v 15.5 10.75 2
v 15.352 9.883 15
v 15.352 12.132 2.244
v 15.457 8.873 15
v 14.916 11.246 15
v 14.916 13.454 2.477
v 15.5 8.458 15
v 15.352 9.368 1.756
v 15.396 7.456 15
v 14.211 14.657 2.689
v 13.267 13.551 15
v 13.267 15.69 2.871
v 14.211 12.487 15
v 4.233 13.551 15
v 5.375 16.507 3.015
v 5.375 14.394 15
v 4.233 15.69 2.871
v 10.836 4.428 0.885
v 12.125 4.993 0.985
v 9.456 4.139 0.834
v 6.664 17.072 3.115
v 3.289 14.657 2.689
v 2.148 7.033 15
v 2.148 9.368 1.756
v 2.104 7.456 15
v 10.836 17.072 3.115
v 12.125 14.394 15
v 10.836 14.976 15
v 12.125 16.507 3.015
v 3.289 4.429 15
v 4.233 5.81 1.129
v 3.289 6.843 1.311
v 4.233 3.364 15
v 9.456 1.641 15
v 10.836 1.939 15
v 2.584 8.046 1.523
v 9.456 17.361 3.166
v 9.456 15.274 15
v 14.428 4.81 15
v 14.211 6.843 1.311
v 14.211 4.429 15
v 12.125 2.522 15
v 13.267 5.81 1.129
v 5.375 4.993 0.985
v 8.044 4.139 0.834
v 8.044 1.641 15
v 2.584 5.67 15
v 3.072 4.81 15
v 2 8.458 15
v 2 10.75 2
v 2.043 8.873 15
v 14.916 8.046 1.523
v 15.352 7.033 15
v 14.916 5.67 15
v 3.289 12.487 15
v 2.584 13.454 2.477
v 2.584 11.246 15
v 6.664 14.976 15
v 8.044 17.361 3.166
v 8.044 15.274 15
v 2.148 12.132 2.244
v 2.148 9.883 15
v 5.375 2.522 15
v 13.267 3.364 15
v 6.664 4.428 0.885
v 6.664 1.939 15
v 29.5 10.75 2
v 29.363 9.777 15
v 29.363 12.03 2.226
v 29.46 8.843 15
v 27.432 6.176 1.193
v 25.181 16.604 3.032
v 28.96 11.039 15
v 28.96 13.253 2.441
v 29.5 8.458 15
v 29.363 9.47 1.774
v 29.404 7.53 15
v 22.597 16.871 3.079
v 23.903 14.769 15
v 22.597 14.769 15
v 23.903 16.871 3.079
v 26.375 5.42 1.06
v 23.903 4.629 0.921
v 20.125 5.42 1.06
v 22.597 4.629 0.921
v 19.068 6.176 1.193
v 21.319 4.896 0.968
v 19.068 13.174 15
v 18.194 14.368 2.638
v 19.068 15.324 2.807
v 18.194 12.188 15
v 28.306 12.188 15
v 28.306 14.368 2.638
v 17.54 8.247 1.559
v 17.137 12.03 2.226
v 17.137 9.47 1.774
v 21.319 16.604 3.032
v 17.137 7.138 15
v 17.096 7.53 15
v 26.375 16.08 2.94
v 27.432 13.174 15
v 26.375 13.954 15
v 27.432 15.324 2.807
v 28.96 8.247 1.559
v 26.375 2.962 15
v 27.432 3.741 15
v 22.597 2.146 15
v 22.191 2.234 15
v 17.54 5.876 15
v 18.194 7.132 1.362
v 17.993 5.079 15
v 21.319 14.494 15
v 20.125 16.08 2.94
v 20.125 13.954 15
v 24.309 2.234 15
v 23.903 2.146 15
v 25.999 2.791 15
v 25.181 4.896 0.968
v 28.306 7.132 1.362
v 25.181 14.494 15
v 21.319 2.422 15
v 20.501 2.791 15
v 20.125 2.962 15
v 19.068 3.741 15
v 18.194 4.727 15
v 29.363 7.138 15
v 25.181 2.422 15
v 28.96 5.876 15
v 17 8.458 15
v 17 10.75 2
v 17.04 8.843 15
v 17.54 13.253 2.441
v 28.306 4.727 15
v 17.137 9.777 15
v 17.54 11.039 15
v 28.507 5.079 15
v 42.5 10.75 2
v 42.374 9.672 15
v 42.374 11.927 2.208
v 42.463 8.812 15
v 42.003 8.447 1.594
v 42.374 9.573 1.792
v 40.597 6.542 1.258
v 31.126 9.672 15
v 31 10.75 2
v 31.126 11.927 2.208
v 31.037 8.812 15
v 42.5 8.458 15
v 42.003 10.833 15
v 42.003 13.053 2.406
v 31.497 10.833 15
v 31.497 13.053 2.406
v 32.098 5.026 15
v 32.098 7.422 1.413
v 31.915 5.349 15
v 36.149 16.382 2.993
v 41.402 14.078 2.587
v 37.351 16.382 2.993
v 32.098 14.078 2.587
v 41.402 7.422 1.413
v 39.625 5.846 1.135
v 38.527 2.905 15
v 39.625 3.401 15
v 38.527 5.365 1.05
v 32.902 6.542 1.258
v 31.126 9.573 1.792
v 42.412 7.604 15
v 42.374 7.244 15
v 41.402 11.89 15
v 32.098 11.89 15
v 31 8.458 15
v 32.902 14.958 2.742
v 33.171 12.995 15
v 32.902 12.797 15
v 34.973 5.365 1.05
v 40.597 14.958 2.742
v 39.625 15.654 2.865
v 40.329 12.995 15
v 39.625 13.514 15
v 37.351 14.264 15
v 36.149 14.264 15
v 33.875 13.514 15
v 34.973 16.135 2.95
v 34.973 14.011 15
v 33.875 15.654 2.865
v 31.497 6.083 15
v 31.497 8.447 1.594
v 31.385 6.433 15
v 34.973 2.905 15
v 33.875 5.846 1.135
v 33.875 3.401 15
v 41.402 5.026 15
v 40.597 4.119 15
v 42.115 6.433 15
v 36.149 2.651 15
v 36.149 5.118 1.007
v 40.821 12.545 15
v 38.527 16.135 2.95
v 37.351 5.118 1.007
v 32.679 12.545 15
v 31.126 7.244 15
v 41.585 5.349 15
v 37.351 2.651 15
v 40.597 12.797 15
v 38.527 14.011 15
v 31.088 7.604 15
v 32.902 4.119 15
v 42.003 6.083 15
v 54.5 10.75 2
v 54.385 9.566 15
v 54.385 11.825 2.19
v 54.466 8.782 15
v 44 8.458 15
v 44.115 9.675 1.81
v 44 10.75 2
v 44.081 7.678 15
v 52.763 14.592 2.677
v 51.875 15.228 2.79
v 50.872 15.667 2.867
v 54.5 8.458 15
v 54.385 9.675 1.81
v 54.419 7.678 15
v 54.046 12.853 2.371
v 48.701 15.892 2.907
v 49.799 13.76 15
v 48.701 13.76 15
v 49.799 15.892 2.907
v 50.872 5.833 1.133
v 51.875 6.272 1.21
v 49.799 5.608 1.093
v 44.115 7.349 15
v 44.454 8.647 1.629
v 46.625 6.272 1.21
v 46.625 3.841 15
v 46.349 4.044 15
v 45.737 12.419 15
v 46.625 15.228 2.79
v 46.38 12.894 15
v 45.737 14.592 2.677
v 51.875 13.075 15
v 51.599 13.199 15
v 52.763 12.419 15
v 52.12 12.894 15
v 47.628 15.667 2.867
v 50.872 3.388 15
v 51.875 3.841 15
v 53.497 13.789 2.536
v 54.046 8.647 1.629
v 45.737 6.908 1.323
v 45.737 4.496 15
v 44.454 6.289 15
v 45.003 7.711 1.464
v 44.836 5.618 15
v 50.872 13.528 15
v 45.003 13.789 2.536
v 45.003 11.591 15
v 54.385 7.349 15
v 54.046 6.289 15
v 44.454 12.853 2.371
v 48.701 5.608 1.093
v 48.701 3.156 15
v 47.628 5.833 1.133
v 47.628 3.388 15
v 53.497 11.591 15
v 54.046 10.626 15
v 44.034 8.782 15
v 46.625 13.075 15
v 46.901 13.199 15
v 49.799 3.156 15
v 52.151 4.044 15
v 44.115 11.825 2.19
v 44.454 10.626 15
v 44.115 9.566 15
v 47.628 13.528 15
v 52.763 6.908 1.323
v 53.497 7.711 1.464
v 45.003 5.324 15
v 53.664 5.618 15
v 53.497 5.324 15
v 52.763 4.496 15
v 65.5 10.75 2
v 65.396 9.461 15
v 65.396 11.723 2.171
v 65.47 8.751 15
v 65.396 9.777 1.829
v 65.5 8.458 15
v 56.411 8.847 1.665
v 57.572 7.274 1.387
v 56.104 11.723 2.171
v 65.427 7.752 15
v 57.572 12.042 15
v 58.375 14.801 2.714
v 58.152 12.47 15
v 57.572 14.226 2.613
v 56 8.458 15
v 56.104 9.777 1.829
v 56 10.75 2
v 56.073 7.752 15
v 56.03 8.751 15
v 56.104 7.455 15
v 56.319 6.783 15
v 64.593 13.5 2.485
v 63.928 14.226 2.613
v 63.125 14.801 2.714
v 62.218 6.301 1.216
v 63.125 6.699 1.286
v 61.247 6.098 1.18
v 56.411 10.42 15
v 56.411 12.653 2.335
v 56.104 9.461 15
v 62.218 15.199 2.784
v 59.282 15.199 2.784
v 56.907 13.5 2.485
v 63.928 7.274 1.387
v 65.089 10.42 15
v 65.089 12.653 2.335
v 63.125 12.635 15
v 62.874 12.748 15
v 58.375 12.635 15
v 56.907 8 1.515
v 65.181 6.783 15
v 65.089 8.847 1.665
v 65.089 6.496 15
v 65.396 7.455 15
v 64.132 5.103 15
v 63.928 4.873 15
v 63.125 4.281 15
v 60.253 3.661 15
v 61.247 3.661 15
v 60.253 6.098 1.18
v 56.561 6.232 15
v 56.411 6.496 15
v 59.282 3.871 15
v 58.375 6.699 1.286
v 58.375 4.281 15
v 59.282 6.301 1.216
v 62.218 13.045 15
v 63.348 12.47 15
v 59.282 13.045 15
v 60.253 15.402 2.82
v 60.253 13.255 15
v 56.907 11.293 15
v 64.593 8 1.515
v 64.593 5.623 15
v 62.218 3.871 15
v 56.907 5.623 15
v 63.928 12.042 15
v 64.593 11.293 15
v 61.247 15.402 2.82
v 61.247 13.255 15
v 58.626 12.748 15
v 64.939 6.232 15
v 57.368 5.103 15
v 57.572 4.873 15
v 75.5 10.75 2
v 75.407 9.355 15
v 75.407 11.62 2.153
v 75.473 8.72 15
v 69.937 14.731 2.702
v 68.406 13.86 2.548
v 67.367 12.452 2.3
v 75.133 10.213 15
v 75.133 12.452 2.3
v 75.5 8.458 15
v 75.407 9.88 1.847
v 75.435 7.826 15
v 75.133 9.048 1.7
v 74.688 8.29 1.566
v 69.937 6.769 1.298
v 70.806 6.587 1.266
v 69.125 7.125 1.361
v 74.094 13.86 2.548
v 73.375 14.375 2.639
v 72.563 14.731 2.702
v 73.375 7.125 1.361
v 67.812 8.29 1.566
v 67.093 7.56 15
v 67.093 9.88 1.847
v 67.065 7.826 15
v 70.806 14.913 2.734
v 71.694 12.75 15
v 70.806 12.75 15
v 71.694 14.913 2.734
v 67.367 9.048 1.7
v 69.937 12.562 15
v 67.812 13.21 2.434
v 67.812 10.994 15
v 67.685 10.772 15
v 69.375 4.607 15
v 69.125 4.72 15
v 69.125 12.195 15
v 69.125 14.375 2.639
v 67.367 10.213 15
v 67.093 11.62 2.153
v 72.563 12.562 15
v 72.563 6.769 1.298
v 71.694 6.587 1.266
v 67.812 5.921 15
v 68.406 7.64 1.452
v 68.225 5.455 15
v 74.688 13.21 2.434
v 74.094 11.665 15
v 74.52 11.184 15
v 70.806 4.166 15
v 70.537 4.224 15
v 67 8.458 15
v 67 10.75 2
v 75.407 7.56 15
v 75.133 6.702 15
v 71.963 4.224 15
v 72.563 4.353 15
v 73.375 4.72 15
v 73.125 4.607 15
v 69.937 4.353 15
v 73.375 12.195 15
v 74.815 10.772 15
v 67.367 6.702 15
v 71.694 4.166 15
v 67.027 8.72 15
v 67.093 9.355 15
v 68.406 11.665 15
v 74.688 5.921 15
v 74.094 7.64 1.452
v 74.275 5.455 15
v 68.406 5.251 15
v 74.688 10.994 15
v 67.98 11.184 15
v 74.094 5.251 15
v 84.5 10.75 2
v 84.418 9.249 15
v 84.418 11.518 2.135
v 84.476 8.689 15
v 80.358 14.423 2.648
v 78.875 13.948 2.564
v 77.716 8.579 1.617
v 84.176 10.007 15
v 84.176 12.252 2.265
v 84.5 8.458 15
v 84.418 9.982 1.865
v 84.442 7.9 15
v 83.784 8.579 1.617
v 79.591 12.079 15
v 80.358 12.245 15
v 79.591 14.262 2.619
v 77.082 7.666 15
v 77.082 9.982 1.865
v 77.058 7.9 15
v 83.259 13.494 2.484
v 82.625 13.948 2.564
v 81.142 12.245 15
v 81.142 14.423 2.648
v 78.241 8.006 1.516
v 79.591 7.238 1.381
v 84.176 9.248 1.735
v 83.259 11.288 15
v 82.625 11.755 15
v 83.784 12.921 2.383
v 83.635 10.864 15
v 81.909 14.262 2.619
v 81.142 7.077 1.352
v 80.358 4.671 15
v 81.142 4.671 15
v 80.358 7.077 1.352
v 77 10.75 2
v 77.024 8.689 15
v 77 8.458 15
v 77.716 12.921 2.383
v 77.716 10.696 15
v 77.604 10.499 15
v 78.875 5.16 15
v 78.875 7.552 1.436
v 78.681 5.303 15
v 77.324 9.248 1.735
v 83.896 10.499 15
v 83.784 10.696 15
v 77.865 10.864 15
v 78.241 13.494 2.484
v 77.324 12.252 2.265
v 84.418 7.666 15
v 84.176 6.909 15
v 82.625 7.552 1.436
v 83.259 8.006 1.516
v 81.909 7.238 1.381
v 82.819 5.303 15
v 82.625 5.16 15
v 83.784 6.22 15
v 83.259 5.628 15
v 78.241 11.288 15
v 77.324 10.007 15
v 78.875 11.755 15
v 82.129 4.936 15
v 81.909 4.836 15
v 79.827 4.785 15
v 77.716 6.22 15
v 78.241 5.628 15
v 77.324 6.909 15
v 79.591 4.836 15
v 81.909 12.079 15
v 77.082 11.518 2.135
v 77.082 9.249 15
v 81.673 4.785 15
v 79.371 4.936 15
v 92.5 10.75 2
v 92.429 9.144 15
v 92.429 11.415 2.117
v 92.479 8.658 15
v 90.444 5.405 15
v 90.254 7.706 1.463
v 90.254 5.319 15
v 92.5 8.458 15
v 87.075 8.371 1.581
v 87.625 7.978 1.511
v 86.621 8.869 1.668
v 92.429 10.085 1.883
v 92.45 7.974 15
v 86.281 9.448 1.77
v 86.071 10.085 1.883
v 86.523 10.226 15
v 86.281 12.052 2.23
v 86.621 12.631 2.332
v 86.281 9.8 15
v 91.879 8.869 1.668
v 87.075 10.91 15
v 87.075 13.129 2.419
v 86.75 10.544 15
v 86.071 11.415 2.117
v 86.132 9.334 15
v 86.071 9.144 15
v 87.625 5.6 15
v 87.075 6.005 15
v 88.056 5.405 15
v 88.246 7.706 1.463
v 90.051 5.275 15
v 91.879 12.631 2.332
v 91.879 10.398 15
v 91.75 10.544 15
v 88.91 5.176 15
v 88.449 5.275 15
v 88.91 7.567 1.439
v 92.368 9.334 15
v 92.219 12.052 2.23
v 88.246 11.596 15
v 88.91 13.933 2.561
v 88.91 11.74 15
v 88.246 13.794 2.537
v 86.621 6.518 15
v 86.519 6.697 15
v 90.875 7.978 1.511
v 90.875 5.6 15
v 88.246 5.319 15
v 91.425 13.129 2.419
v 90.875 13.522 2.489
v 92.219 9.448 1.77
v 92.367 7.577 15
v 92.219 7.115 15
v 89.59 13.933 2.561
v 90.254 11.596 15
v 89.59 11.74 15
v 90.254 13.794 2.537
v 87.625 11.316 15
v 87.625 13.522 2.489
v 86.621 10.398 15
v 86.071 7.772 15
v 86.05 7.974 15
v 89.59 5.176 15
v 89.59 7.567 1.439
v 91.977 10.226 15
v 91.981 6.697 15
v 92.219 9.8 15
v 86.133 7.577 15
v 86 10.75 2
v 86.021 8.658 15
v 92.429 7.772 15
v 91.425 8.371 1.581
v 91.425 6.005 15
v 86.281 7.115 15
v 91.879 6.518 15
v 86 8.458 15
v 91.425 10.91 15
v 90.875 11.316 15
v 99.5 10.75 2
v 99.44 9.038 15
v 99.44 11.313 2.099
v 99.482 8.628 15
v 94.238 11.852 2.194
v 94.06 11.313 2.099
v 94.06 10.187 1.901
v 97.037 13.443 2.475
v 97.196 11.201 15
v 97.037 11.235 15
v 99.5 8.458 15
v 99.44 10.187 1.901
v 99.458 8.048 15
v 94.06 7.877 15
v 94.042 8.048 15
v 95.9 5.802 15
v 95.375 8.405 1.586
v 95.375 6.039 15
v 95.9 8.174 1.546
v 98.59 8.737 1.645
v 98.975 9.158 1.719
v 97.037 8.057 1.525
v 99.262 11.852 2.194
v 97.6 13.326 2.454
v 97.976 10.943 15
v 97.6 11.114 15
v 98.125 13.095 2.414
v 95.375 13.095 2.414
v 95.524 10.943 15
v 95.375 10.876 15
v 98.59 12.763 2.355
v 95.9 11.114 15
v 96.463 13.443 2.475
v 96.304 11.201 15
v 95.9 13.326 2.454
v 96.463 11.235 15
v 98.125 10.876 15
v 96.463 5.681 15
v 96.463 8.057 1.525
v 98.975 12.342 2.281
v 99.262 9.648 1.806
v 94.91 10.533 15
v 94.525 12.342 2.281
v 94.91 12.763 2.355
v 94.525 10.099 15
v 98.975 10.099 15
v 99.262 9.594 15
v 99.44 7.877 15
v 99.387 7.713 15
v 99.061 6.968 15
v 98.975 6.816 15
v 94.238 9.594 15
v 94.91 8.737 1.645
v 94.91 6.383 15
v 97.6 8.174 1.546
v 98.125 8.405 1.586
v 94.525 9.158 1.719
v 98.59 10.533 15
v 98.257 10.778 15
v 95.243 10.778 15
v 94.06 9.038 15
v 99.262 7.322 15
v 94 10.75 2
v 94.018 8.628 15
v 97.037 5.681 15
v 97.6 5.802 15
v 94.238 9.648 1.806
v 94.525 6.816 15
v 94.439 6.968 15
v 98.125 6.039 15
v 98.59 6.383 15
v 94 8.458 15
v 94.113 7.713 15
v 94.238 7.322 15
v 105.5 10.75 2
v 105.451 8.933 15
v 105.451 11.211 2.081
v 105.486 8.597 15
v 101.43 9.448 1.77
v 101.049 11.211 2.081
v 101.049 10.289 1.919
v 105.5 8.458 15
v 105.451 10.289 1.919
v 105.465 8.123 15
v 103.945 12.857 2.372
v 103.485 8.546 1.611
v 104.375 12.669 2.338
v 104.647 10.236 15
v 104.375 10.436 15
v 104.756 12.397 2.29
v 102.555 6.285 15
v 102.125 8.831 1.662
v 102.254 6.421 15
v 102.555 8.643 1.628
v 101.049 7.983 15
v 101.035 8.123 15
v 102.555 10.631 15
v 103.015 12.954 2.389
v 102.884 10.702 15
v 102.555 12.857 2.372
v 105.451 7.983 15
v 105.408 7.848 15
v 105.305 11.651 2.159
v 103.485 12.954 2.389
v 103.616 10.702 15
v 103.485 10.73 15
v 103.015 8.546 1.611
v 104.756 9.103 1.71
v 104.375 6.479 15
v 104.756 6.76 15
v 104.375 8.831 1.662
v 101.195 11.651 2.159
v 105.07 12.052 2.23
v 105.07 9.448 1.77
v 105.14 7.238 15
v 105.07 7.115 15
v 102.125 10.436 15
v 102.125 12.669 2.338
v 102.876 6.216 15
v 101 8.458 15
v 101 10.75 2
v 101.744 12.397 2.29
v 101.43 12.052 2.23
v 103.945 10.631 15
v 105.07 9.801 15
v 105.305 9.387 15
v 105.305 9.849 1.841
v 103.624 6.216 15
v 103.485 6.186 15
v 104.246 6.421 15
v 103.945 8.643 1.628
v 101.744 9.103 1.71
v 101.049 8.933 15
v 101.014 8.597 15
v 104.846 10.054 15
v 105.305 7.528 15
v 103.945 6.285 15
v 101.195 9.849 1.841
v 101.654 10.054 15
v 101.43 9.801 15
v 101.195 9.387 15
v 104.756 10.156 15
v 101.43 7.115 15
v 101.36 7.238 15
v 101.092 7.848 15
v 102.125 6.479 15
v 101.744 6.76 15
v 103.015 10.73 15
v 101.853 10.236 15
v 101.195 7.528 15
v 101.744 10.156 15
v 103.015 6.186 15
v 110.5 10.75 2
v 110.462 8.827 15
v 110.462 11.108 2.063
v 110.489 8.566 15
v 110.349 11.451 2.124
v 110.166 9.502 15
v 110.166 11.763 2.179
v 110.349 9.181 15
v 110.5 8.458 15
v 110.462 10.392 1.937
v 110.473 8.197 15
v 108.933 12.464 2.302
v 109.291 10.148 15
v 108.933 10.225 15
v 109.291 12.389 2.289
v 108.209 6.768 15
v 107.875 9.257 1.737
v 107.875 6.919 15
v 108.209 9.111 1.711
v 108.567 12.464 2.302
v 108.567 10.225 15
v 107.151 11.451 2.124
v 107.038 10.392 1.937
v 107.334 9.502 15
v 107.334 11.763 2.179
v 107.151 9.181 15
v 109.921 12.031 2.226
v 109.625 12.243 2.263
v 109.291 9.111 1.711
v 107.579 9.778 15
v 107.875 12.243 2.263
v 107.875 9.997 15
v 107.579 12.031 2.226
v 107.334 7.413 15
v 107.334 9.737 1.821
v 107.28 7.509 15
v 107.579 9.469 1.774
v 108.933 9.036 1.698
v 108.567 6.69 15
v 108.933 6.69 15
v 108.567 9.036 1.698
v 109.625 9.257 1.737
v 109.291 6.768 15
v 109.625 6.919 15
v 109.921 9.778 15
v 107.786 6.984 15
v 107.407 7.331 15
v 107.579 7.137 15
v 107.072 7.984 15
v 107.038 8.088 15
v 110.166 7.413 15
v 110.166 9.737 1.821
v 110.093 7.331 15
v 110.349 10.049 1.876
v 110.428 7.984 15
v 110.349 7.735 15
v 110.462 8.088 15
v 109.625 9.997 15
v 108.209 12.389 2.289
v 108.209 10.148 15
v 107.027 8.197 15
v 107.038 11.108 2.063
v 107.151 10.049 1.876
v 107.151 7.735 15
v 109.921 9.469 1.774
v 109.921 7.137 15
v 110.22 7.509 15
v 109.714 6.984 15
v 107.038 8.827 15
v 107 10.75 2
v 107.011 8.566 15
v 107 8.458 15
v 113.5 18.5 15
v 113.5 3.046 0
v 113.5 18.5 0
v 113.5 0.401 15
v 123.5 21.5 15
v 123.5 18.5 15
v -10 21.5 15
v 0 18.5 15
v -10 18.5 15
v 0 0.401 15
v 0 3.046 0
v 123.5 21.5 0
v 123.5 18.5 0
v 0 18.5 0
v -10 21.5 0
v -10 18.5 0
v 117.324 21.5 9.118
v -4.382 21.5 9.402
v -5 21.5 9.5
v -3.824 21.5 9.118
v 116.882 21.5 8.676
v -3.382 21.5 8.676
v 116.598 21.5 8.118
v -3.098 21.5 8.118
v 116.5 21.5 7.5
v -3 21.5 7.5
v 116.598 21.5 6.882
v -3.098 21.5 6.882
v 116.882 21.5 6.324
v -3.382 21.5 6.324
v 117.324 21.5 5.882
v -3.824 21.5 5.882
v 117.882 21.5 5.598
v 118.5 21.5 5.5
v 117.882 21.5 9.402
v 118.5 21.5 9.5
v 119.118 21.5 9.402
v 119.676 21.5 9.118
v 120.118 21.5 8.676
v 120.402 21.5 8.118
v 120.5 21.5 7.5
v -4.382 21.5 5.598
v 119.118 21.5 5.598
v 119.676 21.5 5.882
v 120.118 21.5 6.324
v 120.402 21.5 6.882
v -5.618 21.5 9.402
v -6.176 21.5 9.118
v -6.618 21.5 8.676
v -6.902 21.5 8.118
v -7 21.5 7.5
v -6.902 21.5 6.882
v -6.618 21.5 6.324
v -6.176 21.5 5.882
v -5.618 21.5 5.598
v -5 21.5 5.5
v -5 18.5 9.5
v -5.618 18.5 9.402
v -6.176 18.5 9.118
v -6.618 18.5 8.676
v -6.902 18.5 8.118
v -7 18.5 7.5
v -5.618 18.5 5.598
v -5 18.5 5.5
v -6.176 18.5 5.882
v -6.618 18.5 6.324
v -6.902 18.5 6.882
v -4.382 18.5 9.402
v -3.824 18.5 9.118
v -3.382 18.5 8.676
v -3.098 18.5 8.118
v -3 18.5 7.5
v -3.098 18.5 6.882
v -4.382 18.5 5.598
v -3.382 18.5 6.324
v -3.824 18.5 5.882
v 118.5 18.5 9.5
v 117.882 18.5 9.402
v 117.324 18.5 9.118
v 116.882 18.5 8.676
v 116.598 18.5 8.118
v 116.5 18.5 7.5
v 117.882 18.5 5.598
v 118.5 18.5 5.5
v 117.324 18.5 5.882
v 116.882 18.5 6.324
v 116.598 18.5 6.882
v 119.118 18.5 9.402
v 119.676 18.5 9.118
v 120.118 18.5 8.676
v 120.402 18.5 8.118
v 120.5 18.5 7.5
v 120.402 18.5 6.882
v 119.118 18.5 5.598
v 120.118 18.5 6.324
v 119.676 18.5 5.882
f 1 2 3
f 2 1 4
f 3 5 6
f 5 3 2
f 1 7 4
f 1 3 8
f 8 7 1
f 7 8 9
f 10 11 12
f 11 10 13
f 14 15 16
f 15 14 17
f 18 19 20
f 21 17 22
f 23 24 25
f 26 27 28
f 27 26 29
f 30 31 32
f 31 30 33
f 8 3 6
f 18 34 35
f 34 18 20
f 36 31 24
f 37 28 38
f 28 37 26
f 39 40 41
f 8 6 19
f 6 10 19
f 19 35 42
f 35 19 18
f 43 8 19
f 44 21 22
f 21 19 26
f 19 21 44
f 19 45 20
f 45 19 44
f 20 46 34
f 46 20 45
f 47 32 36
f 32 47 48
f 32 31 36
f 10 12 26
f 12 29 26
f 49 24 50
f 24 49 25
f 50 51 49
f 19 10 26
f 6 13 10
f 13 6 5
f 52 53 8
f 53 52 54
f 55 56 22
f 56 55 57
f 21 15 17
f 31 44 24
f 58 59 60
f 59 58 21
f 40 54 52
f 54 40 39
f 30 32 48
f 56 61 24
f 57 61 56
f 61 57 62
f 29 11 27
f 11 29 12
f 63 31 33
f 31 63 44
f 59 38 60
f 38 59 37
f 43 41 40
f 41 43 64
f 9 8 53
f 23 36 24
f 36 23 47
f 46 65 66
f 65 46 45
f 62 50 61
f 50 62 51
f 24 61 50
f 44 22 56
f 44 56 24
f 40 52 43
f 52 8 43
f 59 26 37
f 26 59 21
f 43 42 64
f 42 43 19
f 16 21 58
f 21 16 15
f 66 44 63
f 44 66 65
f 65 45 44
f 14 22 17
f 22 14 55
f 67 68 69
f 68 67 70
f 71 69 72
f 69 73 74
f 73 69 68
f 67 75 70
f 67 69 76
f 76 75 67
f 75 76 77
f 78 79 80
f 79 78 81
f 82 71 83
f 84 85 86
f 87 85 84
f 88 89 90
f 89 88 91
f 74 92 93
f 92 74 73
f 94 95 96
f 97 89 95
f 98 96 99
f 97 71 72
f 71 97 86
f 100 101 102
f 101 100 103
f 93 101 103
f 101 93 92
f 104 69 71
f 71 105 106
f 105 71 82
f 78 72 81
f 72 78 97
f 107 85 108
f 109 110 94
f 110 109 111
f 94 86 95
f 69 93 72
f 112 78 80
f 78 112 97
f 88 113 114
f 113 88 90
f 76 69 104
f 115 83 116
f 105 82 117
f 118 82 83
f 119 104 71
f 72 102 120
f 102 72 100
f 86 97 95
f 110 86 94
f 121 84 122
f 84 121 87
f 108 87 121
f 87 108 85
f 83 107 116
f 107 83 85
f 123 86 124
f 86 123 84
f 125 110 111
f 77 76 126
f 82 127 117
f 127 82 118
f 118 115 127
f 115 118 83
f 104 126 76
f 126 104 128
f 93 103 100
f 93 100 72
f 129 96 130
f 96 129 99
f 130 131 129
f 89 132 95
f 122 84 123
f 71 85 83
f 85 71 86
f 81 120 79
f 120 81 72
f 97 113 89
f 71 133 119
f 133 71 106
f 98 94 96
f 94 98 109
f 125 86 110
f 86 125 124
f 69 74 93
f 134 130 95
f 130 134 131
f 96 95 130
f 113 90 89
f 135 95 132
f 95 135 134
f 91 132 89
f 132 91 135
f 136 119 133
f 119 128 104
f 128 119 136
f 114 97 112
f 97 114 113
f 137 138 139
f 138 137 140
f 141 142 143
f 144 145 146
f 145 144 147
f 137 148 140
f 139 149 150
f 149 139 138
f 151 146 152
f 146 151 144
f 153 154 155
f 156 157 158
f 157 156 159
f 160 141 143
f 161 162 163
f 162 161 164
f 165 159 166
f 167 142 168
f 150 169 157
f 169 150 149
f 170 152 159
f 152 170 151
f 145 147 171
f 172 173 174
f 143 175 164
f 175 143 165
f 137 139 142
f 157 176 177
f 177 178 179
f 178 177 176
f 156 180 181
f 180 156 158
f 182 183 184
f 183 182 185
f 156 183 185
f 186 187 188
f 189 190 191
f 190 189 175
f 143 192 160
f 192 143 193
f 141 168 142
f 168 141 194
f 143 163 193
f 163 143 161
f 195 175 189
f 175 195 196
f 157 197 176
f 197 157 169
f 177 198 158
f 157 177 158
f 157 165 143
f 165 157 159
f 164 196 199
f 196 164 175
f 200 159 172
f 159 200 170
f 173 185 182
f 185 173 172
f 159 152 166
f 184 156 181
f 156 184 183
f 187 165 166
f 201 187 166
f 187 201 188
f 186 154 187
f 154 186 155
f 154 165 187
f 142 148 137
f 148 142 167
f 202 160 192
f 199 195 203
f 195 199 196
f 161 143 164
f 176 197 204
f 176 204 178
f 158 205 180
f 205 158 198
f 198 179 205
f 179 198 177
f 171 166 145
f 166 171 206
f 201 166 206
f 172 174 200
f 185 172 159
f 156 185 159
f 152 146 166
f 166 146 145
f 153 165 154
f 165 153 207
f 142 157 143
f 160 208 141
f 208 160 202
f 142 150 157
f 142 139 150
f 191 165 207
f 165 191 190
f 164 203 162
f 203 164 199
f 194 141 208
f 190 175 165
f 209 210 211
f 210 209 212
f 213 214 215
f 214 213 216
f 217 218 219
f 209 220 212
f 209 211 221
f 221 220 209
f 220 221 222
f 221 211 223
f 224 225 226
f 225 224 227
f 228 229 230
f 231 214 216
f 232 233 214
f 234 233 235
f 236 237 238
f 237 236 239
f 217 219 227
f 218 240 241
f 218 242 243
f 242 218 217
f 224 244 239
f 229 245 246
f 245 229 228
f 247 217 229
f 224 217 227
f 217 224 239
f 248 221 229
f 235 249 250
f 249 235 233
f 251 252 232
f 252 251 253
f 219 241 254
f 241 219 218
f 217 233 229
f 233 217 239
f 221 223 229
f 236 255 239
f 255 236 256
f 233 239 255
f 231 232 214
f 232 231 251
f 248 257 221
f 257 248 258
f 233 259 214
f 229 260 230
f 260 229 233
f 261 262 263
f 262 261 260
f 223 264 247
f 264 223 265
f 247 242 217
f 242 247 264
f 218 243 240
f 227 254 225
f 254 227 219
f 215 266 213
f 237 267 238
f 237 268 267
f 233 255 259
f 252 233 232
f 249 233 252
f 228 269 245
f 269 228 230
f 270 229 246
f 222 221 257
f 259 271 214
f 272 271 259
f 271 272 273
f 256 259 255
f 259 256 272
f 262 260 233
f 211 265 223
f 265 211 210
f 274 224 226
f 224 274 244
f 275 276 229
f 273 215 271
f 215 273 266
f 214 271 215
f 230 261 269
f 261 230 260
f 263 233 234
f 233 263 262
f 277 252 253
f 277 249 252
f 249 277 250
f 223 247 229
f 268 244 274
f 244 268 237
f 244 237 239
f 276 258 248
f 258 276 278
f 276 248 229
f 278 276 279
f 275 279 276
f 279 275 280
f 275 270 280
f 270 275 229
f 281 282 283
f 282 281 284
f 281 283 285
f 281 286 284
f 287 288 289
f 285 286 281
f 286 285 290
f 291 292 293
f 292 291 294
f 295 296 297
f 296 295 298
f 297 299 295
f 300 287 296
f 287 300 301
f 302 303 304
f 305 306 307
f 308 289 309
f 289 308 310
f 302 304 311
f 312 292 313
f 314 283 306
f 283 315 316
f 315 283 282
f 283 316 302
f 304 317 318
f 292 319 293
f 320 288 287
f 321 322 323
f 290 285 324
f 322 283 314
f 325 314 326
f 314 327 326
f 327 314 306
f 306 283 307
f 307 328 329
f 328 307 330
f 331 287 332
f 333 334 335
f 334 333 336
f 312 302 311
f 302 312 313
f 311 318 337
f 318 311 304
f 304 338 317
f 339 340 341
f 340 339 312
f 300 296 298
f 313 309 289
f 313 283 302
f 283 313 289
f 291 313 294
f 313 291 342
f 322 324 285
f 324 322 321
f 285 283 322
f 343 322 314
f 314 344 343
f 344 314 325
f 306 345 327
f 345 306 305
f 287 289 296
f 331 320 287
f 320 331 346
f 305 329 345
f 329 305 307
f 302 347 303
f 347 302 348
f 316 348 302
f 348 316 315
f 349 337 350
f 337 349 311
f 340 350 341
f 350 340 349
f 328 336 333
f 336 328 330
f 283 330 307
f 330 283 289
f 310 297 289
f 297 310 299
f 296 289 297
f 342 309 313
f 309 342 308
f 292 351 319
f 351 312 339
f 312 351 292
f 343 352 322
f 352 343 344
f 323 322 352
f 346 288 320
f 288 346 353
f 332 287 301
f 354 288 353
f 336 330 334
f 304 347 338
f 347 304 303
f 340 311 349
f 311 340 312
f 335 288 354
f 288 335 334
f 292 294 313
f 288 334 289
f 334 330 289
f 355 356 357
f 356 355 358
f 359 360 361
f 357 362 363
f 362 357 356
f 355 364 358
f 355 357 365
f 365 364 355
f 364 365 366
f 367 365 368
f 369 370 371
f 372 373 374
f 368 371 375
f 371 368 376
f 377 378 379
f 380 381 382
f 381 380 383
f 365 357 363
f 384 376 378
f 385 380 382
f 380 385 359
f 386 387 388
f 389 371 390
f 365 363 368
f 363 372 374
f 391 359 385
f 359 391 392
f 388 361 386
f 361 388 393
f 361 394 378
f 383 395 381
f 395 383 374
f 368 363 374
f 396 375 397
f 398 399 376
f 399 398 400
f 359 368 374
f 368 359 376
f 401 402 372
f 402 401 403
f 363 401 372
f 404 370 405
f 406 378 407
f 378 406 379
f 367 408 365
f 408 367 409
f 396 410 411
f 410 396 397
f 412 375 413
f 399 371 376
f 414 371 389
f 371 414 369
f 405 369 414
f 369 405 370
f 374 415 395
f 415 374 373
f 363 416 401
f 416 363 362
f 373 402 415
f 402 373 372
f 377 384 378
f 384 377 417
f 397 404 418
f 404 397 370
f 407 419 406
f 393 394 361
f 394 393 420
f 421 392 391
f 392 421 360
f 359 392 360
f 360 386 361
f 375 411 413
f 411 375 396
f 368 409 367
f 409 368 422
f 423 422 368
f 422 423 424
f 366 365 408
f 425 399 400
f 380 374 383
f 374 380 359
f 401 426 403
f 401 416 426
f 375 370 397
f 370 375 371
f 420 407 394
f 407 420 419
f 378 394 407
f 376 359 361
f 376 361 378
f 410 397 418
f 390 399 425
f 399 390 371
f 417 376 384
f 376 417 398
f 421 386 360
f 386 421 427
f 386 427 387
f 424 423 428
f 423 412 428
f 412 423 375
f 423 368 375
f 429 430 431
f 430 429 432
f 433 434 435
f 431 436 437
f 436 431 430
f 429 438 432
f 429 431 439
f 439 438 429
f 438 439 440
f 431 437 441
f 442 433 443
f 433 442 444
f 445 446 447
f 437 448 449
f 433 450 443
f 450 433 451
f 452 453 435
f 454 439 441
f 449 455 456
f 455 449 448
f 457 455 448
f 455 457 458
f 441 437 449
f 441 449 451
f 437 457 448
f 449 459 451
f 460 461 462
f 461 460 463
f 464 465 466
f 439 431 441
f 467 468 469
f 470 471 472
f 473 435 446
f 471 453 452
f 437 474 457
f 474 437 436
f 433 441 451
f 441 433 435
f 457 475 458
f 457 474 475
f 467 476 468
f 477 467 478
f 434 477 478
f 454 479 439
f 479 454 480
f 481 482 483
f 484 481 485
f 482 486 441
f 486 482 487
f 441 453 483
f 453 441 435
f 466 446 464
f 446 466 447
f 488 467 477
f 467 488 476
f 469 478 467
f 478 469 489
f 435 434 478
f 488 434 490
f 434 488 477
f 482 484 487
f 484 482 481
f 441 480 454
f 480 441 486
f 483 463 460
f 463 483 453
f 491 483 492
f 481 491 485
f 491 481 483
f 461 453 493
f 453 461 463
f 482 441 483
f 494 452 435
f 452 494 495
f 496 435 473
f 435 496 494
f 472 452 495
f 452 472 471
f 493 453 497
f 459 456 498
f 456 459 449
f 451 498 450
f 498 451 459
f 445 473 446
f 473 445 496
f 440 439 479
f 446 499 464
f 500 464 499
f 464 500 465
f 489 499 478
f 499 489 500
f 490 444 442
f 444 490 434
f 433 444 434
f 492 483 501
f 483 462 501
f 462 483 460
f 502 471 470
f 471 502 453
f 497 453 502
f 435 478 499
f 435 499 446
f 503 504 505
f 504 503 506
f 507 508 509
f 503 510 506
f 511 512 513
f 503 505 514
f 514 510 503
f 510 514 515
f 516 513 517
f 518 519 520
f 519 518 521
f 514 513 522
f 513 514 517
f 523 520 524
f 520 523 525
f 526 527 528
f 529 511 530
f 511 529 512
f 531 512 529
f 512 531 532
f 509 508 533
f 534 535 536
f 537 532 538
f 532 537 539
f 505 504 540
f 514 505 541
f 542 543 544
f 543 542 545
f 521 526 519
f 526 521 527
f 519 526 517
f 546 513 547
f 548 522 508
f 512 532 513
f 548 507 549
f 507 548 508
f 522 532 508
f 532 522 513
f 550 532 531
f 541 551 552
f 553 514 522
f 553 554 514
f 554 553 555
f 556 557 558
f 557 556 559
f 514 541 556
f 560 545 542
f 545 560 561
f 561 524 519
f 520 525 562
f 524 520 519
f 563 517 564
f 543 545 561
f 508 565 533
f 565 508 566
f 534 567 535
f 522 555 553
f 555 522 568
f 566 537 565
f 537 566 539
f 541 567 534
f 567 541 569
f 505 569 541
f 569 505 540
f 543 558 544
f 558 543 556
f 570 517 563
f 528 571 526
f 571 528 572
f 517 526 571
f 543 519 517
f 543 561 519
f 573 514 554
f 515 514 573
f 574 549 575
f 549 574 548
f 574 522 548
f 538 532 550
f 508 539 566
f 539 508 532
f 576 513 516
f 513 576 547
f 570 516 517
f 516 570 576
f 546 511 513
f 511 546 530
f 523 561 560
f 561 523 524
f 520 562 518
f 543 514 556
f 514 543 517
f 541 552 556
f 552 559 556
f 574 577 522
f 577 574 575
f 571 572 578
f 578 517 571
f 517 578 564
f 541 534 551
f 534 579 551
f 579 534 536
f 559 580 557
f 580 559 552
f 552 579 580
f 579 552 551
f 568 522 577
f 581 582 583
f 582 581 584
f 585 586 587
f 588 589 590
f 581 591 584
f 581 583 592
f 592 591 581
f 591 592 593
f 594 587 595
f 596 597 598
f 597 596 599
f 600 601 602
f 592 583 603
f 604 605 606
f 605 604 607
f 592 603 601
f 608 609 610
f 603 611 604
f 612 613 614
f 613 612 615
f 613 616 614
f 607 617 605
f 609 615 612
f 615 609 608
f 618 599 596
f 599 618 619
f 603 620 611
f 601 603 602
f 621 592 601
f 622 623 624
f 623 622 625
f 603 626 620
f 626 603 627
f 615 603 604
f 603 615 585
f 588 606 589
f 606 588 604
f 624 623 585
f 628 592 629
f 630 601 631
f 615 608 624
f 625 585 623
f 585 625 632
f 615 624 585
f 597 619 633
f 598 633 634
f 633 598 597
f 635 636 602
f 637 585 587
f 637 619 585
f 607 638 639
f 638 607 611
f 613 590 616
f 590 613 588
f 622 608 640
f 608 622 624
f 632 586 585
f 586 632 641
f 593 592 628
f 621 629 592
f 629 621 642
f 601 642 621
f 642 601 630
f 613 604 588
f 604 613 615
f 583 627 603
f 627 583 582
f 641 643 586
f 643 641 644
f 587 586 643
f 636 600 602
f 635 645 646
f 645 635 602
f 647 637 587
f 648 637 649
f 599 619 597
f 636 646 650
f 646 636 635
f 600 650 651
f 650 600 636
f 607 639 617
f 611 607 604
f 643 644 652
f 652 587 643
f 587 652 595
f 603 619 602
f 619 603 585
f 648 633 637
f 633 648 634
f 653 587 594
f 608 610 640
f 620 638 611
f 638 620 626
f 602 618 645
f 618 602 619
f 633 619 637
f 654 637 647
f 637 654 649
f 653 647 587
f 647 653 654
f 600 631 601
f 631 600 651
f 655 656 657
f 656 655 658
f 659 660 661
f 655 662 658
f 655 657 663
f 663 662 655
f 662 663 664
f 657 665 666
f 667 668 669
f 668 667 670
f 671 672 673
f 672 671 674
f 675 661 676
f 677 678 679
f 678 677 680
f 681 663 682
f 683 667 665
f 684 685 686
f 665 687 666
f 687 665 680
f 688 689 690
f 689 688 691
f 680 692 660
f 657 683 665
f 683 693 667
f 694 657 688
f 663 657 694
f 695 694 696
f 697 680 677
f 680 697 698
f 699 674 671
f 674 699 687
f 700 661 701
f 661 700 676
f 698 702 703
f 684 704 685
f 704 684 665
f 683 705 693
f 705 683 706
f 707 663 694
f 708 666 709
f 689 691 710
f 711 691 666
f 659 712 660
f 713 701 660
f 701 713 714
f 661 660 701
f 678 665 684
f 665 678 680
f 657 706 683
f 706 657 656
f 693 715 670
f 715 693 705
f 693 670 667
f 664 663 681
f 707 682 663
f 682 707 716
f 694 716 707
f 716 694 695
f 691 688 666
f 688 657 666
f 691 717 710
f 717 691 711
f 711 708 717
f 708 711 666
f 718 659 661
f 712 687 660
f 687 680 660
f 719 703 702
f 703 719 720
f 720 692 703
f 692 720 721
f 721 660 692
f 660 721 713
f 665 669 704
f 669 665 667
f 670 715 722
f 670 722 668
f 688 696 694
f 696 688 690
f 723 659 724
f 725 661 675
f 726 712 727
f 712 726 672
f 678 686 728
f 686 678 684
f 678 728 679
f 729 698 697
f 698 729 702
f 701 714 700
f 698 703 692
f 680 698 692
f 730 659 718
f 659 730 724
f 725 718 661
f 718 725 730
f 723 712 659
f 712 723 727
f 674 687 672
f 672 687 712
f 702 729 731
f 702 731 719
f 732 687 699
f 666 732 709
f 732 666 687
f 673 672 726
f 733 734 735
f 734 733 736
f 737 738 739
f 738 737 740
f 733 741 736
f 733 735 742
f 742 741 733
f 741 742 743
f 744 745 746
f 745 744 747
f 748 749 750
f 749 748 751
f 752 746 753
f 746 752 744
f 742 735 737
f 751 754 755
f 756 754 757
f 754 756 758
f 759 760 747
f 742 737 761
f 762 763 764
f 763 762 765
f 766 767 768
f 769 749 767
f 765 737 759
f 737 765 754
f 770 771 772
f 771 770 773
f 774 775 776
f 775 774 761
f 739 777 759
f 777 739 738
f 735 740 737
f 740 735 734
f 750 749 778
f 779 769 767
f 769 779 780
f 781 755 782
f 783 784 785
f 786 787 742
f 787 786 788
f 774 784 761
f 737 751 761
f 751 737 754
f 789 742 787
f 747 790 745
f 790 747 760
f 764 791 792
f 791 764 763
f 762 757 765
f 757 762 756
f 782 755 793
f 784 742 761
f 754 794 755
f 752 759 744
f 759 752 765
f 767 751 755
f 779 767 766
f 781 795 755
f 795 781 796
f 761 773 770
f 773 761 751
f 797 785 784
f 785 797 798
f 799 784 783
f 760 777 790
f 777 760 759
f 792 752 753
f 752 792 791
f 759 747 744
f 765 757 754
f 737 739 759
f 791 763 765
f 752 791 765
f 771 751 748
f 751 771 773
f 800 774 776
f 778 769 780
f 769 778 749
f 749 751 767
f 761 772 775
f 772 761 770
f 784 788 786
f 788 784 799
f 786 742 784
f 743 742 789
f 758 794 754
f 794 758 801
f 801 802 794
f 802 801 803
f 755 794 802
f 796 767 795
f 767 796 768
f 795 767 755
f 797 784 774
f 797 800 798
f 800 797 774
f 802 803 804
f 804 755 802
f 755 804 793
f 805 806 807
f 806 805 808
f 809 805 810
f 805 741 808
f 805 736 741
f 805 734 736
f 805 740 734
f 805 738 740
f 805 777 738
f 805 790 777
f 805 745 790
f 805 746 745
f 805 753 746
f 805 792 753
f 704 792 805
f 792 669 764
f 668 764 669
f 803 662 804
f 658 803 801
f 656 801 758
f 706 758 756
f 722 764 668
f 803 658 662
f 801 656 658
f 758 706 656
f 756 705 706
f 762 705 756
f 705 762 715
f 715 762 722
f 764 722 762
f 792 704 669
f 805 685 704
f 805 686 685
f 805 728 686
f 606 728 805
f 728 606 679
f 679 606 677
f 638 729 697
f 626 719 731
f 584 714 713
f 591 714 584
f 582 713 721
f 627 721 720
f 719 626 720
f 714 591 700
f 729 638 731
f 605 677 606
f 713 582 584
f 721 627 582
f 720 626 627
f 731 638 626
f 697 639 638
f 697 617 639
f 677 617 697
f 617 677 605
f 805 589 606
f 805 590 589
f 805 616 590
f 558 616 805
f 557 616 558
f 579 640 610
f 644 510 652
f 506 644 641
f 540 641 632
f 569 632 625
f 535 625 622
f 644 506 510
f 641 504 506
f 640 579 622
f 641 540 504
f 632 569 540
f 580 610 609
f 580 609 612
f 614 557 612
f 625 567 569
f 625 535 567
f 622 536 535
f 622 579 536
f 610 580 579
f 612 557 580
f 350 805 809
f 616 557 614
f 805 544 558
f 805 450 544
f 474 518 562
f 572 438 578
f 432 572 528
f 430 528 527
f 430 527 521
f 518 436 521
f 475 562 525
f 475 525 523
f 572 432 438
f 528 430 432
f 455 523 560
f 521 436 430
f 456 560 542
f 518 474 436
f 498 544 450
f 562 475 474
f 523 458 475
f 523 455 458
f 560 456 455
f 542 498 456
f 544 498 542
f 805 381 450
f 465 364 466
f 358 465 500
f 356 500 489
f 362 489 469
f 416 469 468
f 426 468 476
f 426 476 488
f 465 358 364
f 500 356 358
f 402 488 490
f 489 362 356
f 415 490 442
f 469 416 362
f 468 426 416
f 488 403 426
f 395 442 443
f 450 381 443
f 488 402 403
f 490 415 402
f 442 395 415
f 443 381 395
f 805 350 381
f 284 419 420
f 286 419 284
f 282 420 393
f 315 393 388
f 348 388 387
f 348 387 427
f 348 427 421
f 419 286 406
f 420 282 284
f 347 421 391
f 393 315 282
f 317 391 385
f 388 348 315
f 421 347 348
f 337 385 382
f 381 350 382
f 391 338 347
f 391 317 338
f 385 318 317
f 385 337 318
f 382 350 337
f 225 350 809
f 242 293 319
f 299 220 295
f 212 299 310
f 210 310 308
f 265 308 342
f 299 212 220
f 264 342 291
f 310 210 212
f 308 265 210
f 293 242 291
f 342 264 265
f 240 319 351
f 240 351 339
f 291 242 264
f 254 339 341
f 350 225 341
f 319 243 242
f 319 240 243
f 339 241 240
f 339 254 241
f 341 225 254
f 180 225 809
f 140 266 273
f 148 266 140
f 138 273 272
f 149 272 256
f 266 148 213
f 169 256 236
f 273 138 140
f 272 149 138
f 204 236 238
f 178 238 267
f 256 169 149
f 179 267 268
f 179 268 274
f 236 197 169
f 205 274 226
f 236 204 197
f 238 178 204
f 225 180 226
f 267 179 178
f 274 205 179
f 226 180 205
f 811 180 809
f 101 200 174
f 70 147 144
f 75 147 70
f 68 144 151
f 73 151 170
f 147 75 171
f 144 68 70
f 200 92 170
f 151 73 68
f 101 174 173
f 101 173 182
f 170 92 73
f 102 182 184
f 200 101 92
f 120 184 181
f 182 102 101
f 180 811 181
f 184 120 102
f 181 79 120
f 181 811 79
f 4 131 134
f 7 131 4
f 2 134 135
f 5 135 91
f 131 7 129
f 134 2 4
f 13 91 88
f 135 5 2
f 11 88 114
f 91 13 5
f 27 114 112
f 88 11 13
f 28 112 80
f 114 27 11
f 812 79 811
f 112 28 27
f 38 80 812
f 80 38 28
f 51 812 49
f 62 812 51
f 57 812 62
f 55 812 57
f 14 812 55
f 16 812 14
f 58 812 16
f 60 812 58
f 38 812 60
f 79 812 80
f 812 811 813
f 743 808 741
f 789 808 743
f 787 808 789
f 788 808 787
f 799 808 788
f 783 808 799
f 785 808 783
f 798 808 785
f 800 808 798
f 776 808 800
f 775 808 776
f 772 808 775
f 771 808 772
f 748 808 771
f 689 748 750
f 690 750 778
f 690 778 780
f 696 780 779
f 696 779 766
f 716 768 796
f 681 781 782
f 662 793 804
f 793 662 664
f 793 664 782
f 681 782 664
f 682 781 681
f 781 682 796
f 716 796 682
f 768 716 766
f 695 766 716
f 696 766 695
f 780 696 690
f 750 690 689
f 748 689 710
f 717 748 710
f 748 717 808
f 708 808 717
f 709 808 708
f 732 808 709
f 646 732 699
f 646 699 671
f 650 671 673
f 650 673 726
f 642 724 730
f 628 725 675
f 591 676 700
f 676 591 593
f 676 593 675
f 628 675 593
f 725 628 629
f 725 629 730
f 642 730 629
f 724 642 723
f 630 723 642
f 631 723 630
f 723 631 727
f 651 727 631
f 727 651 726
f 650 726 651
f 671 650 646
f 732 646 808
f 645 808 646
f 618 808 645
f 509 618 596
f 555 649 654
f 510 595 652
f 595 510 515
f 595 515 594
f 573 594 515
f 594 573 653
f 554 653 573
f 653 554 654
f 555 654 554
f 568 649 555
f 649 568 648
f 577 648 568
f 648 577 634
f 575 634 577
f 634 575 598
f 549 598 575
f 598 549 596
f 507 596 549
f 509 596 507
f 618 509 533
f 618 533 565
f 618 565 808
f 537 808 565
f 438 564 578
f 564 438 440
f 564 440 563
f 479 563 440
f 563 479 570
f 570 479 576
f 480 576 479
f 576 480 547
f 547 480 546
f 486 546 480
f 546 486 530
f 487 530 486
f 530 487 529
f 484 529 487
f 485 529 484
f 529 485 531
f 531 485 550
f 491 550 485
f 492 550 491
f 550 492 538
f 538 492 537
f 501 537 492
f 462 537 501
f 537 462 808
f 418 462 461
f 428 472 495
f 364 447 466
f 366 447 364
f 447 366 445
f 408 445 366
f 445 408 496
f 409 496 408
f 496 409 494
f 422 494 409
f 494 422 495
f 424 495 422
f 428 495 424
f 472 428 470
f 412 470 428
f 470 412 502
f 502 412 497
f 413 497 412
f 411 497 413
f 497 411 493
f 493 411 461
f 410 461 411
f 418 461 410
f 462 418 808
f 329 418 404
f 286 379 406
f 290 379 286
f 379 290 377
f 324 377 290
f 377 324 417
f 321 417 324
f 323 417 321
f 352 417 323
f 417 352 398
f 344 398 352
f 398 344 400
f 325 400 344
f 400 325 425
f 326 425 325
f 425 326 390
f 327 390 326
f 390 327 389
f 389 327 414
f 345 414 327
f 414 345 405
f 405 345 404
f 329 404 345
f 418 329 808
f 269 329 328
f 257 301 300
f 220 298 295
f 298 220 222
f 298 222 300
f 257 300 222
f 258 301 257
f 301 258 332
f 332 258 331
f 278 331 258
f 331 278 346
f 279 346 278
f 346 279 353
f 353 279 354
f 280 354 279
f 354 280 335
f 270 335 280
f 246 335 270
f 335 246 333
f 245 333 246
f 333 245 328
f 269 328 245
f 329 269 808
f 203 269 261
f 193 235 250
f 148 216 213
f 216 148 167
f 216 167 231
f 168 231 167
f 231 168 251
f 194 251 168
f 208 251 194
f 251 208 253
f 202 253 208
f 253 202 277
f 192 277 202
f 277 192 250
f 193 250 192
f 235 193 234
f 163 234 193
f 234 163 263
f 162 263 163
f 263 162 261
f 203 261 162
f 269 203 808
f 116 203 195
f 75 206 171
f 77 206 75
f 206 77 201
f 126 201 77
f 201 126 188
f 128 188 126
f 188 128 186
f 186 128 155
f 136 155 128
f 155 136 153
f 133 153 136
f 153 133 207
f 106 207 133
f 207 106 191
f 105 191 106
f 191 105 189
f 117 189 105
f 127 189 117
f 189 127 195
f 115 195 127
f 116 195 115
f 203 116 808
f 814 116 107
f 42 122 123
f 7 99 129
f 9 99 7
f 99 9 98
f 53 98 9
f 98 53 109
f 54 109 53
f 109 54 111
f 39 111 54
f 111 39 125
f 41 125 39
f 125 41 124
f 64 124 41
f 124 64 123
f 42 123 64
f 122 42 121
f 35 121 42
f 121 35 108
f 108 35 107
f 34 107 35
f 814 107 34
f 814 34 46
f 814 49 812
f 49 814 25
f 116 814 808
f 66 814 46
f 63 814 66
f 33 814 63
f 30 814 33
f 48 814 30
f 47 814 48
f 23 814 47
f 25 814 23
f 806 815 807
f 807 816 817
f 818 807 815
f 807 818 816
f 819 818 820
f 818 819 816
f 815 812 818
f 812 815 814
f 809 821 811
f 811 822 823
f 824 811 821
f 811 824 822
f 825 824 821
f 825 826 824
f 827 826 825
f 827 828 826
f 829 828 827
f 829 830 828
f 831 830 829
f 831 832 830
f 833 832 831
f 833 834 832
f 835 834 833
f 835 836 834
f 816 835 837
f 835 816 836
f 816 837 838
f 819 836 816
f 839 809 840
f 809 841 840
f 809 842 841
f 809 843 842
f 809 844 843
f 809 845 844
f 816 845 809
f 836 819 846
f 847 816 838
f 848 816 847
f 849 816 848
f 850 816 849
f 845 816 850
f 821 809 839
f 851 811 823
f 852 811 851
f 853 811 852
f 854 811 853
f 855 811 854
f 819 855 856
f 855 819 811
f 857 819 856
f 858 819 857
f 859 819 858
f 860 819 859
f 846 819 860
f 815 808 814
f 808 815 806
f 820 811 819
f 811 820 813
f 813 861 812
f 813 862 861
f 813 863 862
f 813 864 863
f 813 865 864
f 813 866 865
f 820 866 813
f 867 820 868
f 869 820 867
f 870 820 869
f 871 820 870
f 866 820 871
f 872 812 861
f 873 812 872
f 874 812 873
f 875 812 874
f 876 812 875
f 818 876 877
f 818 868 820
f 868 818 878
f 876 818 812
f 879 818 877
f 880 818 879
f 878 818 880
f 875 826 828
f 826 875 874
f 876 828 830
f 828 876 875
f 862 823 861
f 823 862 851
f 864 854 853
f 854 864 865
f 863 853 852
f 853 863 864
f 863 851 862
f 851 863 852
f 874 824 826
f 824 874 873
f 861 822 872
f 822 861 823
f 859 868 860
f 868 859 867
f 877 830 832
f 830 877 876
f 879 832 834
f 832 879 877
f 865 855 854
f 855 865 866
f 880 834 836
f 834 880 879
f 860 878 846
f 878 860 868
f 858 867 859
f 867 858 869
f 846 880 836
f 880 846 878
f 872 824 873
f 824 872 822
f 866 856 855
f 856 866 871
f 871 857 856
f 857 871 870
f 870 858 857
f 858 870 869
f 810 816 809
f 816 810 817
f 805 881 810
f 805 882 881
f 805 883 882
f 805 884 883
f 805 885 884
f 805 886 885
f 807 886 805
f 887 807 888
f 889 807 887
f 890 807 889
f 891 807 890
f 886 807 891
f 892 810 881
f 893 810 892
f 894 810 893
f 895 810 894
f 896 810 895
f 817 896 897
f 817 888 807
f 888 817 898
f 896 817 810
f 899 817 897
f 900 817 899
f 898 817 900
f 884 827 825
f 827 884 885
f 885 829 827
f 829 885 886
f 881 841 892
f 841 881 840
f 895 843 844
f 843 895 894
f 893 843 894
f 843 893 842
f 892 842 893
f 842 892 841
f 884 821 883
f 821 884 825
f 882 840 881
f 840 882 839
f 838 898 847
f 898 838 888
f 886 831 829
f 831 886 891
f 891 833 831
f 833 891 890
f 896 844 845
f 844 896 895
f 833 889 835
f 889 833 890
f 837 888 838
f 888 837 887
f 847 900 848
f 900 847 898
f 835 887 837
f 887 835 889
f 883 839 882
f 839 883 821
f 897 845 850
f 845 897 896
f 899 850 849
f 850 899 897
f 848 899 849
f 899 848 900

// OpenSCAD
// Soma elementos de um vetor:
function add( v, i = 0, r = 0 ) = len( v ) > i ? add( v, i + 1, r + v[ i ] ) : r;

//Diâmetros das brocas:
diams_orig = [ 13, 12, 11, 10, 9, 8, 7, 6, 5, 4, 3 ];
// Tolerância:
tol = 0.5;
diams = [ for( d = diams_orig ) d + tol ];
// Separação entre os furos:
sep = 2;
// Altura do porta-brocas:
h = 15;
// Excesso em largura:
el = 4;
// Largura do porta-brocas:
l = max( diams ) + 2 * el;
// Comprimento do porta-brocas:
c = add( diams ) + sep * ( len( diams ) - 1 );
// Ângulo das brocas:
a = 10;

difference(){
    cube( [ c, l, h ] );
    for( i = [ 0 : len( diams ) - 1 ] )
    {
        translate(
            [
                ( i + 1 ) * sep + add( [ for( j = [ 0 : i ] ) diams[ j ] ] ) - diams[ 0 ] / 2,
                l / 2,
                2
            ]
        )
            rotate( a, [ 1, 0, 0 ] )
                cylinder( d = diams[ i ], h = 3 * h, $fn = 30 );
        echo( diams[ i ] );
    }
    rotate( a, [ 1, 0, 0 ] )
    translate( [ -10, -100 + 3, -1 ] )
        cube( [ 20 + c, 100, 100 ] );
}

aba_l = 10;
module aba()
{
    difference()
    {
        cube( [ aba_l + 1, 3, h ] );
        translate( [ aba_l / 2, 15, h / 2 ] )
            rotate( 90, [ 1, 0, 0 ] )
                cylinder( d = 4, h = 30, $fn = 20 );
    }
}
translate( [ -aba_l, l - 3, 0 ] )
    aba();
translate( [ c + aba_l, l - 3, 0 ] )
    mirror( [ 1, 0, 0 ] )
        aba();
